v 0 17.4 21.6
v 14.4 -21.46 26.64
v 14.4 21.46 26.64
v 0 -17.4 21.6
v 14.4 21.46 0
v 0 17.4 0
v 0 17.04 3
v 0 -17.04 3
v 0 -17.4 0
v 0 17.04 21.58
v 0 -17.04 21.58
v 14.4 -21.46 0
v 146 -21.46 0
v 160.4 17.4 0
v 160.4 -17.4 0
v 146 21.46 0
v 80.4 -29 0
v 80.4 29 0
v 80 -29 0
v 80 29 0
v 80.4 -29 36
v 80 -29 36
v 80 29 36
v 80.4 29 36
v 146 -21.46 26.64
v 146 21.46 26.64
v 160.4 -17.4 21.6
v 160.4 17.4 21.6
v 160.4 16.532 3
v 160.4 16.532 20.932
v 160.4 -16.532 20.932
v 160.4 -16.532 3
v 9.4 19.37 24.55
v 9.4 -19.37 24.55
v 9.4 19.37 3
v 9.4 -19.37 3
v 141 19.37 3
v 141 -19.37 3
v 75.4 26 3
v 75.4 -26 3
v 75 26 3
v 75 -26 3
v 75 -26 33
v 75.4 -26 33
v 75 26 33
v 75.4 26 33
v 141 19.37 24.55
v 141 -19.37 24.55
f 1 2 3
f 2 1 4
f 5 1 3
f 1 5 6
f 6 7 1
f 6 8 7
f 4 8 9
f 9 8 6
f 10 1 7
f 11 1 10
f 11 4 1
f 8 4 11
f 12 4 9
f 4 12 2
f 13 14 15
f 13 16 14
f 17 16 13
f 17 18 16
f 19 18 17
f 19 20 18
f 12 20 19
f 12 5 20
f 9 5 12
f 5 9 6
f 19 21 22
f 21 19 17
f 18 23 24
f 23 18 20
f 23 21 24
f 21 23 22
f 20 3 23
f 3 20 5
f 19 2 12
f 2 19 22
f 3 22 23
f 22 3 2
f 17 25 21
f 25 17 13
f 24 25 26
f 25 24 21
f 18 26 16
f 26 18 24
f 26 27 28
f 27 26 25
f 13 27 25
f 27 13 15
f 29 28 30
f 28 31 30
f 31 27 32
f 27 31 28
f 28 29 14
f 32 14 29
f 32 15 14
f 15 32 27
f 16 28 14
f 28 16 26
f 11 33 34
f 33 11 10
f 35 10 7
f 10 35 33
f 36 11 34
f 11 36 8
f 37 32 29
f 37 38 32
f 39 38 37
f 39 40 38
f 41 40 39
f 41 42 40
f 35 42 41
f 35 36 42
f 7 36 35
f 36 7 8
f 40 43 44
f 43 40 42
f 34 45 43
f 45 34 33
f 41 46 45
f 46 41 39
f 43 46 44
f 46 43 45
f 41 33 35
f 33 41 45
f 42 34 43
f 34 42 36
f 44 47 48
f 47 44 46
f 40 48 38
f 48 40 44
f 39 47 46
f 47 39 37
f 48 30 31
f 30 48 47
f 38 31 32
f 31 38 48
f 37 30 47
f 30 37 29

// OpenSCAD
$fn = 32;

// ----------------------------------------------------------------------
// Faired channel: 160 x 58 x 36 mm, 3 mm walls, faired ends
// ----------------------------------------------------------------------

// --- parameters (mm) ---
length = 160;             // channel length
width = 58;               // channel width at mid length
height = 36;              // channel height at mid length
wall = 3;                 // side wall thickness
floor_t = 3;              // floor thickness
end_w = 34.8;             // faired end width
end_h = 21.6;             // faired end height

difference() {
  union() {
    hull() {
      translate([0, -17.4, 0]) cube([0.4, 34.8, 21.6]);
      translate([14.4, -21.46, 0]) cube([0.4, 42.92, 26.64]);
    }
    hull() {
      translate([14.4, -21.46, 0]) cube([0.4, 42.92, 26.64]);
      translate([80, -29, 0]) cube([0.4, 58, 36]);
    }
    hull() {
      translate([80, -29, 0]) cube([0.4, 58, 36]);
      translate([145.6, -21.46, 0]) cube([0.4, 42.92, 26.64]);
    }
    hull() {
      translate([145.6, -21.46, 0]) cube([0.4, 42.92, 26.64]);
      translate([160, -17.4, 0]) cube([0.4, 34.8, 21.6]);
    }
  }
  /* cavity, 5 mm proud of both ends so the ports are cut clean */
  hull() {
    translate([-5, -15.8, 3]) cube([0.4, 31.6, 17]);
    translate([9.4, -19.37, 3]) cube([0.4, 38.74, 21.55]);
  }
  hull() {
    translate([9.4, -19.37, 3]) cube([0.4, 38.74, 21.55]);
    translate([75, -26, 3]) cube([0.4, 52, 30]);
  }
  hull() {
    translate([75, -26, 3]) cube([0.4, 52, 30]);
    translate([140.6, -19.37, 3]) cube([0.4, 38.74, 21.55]);
  }
  hull() {
    translate([140.6, -19.37, 3]) cube([0.4, 38.74, 21.55]);
    translate([165, -15.8, 3]) cube([0.4, 31.6, 17]);
  }
}
